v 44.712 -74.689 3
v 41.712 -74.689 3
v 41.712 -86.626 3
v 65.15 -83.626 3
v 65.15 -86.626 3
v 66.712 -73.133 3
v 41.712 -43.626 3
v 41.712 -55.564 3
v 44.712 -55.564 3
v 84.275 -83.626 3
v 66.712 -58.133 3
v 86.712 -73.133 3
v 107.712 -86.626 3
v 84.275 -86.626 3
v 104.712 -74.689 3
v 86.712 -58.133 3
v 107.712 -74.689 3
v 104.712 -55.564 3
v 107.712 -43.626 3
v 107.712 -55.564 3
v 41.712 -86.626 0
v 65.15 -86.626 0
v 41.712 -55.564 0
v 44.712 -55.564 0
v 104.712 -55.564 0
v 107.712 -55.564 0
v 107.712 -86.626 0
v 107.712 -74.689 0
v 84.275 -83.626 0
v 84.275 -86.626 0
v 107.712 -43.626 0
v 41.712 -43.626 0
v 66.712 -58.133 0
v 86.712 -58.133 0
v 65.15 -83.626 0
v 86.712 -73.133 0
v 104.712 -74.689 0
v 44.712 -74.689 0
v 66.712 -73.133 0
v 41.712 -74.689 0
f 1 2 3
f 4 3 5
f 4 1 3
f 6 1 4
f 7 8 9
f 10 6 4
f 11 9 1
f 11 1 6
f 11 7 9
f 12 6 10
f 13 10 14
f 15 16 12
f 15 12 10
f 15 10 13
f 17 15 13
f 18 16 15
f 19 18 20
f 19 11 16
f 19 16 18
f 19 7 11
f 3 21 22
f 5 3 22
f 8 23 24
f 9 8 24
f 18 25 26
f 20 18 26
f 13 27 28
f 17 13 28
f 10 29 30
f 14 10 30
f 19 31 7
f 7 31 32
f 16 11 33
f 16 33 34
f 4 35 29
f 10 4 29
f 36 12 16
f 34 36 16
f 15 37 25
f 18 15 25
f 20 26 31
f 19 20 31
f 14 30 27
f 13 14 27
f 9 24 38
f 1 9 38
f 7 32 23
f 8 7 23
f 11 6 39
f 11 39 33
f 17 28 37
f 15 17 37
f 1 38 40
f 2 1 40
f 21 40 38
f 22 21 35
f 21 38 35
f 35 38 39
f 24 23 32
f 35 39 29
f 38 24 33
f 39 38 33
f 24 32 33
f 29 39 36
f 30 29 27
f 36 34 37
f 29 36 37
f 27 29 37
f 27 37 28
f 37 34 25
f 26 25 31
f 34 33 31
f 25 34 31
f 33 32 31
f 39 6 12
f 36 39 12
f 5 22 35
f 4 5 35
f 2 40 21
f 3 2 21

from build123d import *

# Parameters (mm, degrees)
BOSS_EXTRUDE1_DEPTH = 3
SKETCH2_W           = 20
SKETCH2_H           = 15
CUT_EXTRUDE2_DEPTH  = 10


with BuildPart() as part:
    # Sketch1 → Boss-Extrude1 (new body)
    with BuildSketch(Plane.XY):
        Polygon((41.712301942, -43.626199709), (41.712301942, -55.563699709), (44.712301942, -55.563699709), (44.712301942, -74.688699709), (41.712301942, -74.688699709), (41.712301942, -86.626199709), (65.149801942, -86.626199709), (65.149801942, -83.626199709), (84.274801942, -83.626199709), (84.274801942, -86.626199709), (103.399801942, -86.626199709), (107.712301942, -86.626199709), (107.712301942, -74.688699709), (104.712301942, -74.688699709), (104.712301942, -55.563699709), (107.712301942, -55.563699709), (107.712301942, -43.626199709), align=None)
    extrude(amount=BOSS_EXTRUDE1_DEPTH)

    # Sketch2 → Cut-Extrude2 (cut)
    with BuildSketch(Plane.XY.offset(3)):
        with Locations((76.712301942, -65.632728749)):
            Rectangle(SKETCH2_W, SKETCH2_H)
    extrude(amount=-CUT_EXTRUDE2_DEPTH, mode=Mode.SUBTRACT)


solid = part.part
